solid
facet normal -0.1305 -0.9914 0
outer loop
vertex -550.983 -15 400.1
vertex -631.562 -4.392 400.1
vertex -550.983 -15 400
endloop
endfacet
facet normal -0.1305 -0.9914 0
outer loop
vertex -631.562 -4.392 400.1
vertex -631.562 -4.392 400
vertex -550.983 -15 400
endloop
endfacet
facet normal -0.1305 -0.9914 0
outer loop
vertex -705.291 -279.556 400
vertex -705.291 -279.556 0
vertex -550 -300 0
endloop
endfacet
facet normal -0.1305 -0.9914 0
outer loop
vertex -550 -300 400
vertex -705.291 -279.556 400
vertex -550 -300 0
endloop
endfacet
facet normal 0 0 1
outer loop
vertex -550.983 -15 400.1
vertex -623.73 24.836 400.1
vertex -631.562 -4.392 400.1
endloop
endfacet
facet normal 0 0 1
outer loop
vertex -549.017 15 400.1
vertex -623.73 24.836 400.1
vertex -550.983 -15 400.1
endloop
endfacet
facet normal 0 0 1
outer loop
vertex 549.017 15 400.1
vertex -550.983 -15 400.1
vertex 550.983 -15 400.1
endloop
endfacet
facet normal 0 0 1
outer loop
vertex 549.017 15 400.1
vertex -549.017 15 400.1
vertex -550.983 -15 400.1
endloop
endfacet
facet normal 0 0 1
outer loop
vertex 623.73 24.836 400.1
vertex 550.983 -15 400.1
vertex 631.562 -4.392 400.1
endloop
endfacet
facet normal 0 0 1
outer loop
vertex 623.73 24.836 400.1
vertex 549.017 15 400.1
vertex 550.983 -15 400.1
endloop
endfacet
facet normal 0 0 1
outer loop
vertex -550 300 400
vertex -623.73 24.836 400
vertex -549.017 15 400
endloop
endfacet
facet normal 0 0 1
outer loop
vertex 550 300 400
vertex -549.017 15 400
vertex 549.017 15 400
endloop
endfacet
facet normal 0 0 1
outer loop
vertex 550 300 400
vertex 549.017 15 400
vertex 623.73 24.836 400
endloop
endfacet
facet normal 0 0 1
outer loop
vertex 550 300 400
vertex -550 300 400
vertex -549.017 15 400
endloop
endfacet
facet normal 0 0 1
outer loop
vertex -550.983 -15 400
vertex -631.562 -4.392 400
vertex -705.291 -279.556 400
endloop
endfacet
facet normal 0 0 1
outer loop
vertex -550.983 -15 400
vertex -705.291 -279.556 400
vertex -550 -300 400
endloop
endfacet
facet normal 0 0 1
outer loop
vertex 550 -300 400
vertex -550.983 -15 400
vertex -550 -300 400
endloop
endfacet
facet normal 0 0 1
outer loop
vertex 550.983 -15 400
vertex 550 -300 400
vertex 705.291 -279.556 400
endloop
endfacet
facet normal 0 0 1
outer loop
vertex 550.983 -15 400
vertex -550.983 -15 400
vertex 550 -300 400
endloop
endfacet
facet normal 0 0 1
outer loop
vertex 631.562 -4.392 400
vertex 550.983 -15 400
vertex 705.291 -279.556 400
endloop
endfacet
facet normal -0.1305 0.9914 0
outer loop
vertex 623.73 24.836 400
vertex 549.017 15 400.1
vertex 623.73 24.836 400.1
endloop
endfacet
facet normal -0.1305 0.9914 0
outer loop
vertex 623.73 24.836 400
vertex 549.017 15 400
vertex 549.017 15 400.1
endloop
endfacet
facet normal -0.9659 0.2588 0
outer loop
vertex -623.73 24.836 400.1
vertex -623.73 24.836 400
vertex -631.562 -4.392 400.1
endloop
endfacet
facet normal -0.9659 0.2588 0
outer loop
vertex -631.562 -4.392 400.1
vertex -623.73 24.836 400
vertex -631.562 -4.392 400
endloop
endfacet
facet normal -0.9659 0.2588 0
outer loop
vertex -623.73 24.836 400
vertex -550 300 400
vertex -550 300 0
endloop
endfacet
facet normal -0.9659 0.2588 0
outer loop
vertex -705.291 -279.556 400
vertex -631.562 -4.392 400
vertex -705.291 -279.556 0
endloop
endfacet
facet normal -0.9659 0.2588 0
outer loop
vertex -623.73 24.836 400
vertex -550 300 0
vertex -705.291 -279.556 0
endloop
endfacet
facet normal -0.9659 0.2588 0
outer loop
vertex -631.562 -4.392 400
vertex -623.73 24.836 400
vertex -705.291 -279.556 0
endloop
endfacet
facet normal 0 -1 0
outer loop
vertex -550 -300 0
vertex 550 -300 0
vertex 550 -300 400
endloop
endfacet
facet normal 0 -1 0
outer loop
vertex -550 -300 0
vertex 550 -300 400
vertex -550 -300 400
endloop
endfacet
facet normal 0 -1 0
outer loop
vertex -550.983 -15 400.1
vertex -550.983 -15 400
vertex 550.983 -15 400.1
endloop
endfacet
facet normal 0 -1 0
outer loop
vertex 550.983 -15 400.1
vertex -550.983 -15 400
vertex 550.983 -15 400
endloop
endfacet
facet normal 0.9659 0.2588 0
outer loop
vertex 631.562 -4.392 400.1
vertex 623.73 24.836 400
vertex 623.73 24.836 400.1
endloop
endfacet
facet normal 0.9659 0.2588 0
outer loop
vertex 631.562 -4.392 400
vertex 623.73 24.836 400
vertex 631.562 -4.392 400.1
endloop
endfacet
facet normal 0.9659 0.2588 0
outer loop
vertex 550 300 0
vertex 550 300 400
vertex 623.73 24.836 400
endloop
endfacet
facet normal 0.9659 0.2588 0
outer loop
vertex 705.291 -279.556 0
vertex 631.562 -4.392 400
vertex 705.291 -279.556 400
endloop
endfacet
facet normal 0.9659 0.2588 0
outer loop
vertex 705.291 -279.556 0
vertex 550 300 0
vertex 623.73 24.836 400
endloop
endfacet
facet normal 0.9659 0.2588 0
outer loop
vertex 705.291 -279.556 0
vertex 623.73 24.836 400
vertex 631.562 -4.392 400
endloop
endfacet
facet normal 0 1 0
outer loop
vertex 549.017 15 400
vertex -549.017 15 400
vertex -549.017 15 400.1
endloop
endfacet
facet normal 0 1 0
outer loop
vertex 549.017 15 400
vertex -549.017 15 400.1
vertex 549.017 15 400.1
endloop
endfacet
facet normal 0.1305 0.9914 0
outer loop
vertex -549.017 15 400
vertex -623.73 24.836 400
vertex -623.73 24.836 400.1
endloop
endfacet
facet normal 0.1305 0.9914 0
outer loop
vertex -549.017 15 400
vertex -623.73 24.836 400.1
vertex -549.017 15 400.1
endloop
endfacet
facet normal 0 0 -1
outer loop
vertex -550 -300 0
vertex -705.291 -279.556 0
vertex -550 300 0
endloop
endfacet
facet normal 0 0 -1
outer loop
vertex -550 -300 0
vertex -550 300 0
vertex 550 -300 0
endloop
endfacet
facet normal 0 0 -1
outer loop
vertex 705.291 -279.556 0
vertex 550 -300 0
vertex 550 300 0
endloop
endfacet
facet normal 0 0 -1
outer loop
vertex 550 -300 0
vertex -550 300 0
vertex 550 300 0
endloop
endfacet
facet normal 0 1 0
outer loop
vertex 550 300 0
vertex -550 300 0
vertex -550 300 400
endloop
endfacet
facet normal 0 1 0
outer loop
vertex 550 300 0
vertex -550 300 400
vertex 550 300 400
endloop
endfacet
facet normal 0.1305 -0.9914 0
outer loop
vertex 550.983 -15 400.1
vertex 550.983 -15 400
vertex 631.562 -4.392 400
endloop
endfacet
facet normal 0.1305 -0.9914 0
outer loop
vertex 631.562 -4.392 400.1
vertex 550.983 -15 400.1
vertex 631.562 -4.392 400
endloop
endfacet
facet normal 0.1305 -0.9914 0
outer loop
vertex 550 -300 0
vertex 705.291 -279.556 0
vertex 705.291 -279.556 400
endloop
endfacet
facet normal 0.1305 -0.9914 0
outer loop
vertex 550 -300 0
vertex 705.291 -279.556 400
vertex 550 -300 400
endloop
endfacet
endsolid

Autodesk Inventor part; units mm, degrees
ref_plane "YZ Plane" through (0, 0, 0) normal (1, 0, 0) x (0, 1, 0)
ref_plane "XZ Plane" through (0, 0, 0) normal (0, 1, 0) x (-1, 0, 0)
ref_plane "XY Plane" through (0, 0, 0) normal (0, 0, 1) x (1, 0, 0)
sketch "スケッチ1" plane through (0, 0, 0) normal (0, 0, 1) x (1, 0, 0)
  line L0 (-550, 300) -> (550, 300)
  line L1 (550, 300) -> (550, -300)
  line L2 (550, -300) -> (-550, -300)
  line L3 (-550, -300) -> (-550, 300)
  line L4 (-550, 300) -> (-705.2914, -279.5555)
  line L5 (-705.2914, -279.5555) -> (-550, -300)
  line L6 (-550, 0) -> (-627.6457, 10.2223)
  line L7 (550, 300) -> (705.2914, -279.5555)
  line L8 (705.2914, -279.5555) -> (550, -300)
  point P0 (0, 0)
  point P1 (0, 300)
  point P2 (550, 0)
  dimension "d0" = 600
  dimension "d1" = 1100
  dimension "d2" = 15
  dimension "d3" = 600
  dimension "d4" = 600
  dimension "d5" = 15
extrude "押し出し1" add sketch "スケッチ1" along normal blind 400
sketch "スケッチ2" plane through (0, 0, 400) normal (0, 0, 1) x (1, 0, 0)
  line L0 (-550, 300) -> (-705.2914, -279.5555) projected
  line L1 (705.2914, -279.5555) -> (550, 300) projected
  line L2 (550, 300) -> (-550, 300) projected
  line L3 (-550, 300) -> (-550, -300)
  line L4 (550, -300) -> (550, 300)
  line L5 (-627.6457, 10.2223) -> (-550, 0)
  line L6 (550, 0) -> (-550, 0)
  line L7 (550, 0) -> (627.6457, 10.2223)
  line L8 (-631.5615, -4.3917) -> (-550.9832, -15)
  line L9 (-550.9832, -15) -> (550.9832, -15)
  line L10 (550.9832, -15) -> (631.5615, -4.3917)
  line L11 (-623.7299, 24.8362) -> (-549.0168, 15)
  line L12 (-549.0168, 15) -> (549.0168, 15)
  line L13 (549.0168, 15) -> (623.7299, 24.8362)
  line L14 (631.5615, -4.3917) -> (623.7299, 24.8362)
  line L15 (-631.5615, -4.3917) -> (-623.7299, 24.8362)
  point P0 (0, 0)
  dimension "d8" = 15
  dimension "d10" = 15
  dimension "d11" = 30
  dimension "d12" = 15
  dimension "d13" = 30
  dimension "d14" = 15
extrude "押し出し2" add sketch "スケッチ2" along normal blind 0.1 contours L11 L3 L5 L0 | L11 L12 L13 L4 L6 L3 | L5 L3 L9 L8 L0 | L1 L7 L4 L13 | L6 L4 L9 L3 | L1 L10 L9 L4 L7
properties part number "Hill 2"
